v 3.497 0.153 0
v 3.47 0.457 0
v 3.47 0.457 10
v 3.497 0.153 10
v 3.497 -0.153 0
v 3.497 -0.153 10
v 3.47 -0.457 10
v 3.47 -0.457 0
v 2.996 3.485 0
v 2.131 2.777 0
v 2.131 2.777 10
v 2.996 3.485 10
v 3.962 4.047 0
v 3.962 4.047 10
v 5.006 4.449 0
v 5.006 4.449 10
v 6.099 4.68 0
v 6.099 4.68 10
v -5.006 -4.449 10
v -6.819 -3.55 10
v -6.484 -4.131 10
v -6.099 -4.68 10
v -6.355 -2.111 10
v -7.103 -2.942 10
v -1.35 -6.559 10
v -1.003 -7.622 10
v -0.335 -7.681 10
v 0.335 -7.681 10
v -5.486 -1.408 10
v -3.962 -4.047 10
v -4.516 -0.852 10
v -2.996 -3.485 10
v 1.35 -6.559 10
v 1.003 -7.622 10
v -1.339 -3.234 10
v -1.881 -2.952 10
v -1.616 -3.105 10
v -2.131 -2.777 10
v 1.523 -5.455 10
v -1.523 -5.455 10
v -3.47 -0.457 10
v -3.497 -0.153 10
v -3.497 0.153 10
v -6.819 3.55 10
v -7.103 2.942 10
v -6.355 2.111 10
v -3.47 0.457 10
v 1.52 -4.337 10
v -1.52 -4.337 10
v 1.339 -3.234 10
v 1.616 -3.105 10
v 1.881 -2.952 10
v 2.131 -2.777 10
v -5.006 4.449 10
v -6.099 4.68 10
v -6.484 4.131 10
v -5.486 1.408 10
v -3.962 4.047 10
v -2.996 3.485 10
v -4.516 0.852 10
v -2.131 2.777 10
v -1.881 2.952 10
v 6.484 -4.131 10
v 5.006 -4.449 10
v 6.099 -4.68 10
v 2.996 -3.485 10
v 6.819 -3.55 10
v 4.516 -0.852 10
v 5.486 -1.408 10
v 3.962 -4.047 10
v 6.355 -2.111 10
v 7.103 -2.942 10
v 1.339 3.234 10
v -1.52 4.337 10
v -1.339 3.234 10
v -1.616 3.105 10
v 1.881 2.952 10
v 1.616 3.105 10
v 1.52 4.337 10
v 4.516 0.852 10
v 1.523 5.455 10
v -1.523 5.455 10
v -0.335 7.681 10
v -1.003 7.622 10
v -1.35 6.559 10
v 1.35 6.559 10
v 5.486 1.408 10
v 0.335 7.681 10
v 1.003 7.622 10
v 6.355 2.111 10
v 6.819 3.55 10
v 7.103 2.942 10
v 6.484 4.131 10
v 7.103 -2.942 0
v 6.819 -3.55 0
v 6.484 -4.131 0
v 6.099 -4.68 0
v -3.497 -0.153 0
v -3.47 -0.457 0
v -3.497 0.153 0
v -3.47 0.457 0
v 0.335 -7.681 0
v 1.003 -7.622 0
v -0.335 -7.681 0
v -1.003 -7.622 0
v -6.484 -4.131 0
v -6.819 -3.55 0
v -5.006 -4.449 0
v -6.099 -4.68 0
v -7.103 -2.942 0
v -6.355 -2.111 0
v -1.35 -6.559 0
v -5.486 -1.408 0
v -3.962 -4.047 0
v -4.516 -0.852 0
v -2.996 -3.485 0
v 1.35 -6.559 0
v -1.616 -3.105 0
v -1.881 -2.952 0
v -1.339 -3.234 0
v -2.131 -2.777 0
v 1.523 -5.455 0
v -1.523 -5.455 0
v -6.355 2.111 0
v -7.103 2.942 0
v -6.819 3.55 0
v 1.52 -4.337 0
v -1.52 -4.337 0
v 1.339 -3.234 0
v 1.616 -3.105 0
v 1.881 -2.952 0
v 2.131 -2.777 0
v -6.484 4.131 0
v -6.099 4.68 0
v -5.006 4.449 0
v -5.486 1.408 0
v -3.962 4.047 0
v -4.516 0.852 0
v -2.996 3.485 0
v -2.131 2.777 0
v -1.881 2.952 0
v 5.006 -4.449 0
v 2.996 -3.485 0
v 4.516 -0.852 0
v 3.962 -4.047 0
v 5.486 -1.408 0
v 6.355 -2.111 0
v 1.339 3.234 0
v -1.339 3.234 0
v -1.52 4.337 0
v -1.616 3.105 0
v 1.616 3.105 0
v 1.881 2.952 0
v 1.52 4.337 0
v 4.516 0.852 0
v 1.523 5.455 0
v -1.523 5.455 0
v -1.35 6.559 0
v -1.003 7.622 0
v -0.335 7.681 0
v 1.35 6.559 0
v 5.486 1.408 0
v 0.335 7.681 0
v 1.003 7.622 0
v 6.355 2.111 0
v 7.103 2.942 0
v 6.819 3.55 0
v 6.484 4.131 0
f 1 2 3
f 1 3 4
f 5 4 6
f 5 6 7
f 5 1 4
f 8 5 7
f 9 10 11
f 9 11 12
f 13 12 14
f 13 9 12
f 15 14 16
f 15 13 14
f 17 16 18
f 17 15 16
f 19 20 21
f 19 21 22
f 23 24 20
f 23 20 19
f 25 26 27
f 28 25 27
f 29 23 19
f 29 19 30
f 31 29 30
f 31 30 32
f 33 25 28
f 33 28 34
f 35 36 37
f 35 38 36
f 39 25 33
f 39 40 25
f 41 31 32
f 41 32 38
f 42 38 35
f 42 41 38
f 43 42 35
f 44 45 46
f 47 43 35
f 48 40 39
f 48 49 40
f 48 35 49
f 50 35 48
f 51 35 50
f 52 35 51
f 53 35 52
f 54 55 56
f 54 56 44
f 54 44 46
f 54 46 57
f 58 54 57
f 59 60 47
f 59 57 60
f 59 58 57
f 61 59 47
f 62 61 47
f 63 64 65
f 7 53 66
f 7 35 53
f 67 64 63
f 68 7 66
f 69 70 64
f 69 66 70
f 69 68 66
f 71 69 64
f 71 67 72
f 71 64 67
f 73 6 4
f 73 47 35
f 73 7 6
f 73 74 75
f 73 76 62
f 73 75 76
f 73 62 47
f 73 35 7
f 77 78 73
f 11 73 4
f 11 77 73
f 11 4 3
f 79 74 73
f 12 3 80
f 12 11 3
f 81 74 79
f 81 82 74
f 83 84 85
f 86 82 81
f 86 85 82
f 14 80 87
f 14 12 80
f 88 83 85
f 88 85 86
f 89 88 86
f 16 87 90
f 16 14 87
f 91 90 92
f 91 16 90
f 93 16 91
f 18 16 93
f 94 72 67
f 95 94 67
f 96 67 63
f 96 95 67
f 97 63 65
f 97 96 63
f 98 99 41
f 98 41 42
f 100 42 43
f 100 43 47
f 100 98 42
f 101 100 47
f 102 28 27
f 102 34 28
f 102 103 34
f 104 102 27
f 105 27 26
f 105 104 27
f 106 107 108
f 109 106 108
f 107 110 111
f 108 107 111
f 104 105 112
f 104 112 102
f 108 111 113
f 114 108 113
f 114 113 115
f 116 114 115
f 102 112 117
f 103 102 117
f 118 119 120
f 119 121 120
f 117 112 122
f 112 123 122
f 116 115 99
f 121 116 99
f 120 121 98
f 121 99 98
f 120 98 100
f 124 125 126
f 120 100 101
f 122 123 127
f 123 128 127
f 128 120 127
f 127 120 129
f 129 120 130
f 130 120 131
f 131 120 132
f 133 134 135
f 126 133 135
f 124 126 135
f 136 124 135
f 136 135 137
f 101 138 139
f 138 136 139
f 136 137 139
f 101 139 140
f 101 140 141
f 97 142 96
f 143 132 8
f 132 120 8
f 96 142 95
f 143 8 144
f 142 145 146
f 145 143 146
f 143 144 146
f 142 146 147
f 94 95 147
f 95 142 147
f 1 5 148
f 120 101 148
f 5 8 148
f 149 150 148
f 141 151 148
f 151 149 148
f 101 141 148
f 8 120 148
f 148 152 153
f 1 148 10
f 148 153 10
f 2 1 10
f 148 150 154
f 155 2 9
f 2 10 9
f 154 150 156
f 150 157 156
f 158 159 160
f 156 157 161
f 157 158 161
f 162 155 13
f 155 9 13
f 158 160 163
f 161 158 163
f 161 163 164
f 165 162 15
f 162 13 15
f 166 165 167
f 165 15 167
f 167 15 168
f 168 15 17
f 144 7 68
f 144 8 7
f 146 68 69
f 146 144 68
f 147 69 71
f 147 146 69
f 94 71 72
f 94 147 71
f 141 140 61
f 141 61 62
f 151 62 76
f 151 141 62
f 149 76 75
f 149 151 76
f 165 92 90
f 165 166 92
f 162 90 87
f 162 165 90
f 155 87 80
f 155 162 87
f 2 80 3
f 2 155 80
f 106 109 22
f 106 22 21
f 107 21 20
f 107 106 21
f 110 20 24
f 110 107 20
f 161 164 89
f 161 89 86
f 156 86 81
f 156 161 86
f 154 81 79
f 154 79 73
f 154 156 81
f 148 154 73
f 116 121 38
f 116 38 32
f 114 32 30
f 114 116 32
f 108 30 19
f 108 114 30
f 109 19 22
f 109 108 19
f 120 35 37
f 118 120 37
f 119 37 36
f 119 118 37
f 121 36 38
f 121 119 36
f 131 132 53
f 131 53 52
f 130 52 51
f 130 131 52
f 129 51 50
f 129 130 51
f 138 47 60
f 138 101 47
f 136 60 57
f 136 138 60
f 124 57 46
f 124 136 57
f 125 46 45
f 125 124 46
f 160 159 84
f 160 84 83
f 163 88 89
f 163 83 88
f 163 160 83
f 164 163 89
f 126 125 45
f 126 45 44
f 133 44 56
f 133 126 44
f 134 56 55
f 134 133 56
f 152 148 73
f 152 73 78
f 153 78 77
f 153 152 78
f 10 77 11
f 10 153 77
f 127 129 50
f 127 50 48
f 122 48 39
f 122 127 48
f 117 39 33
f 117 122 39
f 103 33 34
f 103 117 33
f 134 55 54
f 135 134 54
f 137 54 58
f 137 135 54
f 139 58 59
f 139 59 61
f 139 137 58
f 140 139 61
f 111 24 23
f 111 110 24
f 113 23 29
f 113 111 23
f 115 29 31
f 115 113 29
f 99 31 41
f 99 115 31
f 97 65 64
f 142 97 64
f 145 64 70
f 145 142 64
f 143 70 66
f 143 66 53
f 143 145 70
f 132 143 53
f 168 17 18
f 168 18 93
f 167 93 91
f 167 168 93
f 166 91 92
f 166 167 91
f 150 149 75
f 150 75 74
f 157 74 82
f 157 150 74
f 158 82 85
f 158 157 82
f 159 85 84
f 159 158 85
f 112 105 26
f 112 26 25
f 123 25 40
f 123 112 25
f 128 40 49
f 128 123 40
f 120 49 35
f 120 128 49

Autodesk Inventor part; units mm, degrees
sketch "Sketch1" plane through (0, 0, 0) normal (0, 0, 1) x (1, 0, 0)
  circle A0 centre (0, 0) radius 7.688
  dimension "d0" = 15.376
extrude "Extrusion1" add sketch "Sketch1" along normal blind 10
ref_plane "Work Plane2" through (0, 0, 5) normal (0, 0, 1) x (1, 0, 0)
sketch "Sketch2" plane through (0, 0, 0) normal (0, 0, -1) x (-1, 0, 0)
  circle A0 centre (0, 0) radius 7.688 projected
  circle A1 centre (0, 0) radius 6
  dimension "d3" = 12
surface extrude "Pitch Diameter" sketch "Sketch2" against normal through all shown no curves A1
ref_plane "Work Plane8" through (0, 0, 0) normal (0.8660254, 0.5, 0) x (0, 0, 1)
ref_plane "Work Plane9" through (0, 0, 0) normal (1, 0, 0) x (0, 1, 0)
spur gear teeth "Spur Gear" teeth 6 pitch diameter 12 tip diameter 15.376 root diameter 7 face width 10 start plane through (0, 0, 0) normal (0, 0, -1) x (-1, 0, 0)
equation "\"d0\" = da_da"
equation "\"d1\" = da_b"
equation "\"d3\" = da_d"
equation "\"da_da\" = 15.376043"
equation "\"da_b\" = 10"
equation "\"da_d\" = 12"
properties part number "Spur Gear1" material "Steel"
